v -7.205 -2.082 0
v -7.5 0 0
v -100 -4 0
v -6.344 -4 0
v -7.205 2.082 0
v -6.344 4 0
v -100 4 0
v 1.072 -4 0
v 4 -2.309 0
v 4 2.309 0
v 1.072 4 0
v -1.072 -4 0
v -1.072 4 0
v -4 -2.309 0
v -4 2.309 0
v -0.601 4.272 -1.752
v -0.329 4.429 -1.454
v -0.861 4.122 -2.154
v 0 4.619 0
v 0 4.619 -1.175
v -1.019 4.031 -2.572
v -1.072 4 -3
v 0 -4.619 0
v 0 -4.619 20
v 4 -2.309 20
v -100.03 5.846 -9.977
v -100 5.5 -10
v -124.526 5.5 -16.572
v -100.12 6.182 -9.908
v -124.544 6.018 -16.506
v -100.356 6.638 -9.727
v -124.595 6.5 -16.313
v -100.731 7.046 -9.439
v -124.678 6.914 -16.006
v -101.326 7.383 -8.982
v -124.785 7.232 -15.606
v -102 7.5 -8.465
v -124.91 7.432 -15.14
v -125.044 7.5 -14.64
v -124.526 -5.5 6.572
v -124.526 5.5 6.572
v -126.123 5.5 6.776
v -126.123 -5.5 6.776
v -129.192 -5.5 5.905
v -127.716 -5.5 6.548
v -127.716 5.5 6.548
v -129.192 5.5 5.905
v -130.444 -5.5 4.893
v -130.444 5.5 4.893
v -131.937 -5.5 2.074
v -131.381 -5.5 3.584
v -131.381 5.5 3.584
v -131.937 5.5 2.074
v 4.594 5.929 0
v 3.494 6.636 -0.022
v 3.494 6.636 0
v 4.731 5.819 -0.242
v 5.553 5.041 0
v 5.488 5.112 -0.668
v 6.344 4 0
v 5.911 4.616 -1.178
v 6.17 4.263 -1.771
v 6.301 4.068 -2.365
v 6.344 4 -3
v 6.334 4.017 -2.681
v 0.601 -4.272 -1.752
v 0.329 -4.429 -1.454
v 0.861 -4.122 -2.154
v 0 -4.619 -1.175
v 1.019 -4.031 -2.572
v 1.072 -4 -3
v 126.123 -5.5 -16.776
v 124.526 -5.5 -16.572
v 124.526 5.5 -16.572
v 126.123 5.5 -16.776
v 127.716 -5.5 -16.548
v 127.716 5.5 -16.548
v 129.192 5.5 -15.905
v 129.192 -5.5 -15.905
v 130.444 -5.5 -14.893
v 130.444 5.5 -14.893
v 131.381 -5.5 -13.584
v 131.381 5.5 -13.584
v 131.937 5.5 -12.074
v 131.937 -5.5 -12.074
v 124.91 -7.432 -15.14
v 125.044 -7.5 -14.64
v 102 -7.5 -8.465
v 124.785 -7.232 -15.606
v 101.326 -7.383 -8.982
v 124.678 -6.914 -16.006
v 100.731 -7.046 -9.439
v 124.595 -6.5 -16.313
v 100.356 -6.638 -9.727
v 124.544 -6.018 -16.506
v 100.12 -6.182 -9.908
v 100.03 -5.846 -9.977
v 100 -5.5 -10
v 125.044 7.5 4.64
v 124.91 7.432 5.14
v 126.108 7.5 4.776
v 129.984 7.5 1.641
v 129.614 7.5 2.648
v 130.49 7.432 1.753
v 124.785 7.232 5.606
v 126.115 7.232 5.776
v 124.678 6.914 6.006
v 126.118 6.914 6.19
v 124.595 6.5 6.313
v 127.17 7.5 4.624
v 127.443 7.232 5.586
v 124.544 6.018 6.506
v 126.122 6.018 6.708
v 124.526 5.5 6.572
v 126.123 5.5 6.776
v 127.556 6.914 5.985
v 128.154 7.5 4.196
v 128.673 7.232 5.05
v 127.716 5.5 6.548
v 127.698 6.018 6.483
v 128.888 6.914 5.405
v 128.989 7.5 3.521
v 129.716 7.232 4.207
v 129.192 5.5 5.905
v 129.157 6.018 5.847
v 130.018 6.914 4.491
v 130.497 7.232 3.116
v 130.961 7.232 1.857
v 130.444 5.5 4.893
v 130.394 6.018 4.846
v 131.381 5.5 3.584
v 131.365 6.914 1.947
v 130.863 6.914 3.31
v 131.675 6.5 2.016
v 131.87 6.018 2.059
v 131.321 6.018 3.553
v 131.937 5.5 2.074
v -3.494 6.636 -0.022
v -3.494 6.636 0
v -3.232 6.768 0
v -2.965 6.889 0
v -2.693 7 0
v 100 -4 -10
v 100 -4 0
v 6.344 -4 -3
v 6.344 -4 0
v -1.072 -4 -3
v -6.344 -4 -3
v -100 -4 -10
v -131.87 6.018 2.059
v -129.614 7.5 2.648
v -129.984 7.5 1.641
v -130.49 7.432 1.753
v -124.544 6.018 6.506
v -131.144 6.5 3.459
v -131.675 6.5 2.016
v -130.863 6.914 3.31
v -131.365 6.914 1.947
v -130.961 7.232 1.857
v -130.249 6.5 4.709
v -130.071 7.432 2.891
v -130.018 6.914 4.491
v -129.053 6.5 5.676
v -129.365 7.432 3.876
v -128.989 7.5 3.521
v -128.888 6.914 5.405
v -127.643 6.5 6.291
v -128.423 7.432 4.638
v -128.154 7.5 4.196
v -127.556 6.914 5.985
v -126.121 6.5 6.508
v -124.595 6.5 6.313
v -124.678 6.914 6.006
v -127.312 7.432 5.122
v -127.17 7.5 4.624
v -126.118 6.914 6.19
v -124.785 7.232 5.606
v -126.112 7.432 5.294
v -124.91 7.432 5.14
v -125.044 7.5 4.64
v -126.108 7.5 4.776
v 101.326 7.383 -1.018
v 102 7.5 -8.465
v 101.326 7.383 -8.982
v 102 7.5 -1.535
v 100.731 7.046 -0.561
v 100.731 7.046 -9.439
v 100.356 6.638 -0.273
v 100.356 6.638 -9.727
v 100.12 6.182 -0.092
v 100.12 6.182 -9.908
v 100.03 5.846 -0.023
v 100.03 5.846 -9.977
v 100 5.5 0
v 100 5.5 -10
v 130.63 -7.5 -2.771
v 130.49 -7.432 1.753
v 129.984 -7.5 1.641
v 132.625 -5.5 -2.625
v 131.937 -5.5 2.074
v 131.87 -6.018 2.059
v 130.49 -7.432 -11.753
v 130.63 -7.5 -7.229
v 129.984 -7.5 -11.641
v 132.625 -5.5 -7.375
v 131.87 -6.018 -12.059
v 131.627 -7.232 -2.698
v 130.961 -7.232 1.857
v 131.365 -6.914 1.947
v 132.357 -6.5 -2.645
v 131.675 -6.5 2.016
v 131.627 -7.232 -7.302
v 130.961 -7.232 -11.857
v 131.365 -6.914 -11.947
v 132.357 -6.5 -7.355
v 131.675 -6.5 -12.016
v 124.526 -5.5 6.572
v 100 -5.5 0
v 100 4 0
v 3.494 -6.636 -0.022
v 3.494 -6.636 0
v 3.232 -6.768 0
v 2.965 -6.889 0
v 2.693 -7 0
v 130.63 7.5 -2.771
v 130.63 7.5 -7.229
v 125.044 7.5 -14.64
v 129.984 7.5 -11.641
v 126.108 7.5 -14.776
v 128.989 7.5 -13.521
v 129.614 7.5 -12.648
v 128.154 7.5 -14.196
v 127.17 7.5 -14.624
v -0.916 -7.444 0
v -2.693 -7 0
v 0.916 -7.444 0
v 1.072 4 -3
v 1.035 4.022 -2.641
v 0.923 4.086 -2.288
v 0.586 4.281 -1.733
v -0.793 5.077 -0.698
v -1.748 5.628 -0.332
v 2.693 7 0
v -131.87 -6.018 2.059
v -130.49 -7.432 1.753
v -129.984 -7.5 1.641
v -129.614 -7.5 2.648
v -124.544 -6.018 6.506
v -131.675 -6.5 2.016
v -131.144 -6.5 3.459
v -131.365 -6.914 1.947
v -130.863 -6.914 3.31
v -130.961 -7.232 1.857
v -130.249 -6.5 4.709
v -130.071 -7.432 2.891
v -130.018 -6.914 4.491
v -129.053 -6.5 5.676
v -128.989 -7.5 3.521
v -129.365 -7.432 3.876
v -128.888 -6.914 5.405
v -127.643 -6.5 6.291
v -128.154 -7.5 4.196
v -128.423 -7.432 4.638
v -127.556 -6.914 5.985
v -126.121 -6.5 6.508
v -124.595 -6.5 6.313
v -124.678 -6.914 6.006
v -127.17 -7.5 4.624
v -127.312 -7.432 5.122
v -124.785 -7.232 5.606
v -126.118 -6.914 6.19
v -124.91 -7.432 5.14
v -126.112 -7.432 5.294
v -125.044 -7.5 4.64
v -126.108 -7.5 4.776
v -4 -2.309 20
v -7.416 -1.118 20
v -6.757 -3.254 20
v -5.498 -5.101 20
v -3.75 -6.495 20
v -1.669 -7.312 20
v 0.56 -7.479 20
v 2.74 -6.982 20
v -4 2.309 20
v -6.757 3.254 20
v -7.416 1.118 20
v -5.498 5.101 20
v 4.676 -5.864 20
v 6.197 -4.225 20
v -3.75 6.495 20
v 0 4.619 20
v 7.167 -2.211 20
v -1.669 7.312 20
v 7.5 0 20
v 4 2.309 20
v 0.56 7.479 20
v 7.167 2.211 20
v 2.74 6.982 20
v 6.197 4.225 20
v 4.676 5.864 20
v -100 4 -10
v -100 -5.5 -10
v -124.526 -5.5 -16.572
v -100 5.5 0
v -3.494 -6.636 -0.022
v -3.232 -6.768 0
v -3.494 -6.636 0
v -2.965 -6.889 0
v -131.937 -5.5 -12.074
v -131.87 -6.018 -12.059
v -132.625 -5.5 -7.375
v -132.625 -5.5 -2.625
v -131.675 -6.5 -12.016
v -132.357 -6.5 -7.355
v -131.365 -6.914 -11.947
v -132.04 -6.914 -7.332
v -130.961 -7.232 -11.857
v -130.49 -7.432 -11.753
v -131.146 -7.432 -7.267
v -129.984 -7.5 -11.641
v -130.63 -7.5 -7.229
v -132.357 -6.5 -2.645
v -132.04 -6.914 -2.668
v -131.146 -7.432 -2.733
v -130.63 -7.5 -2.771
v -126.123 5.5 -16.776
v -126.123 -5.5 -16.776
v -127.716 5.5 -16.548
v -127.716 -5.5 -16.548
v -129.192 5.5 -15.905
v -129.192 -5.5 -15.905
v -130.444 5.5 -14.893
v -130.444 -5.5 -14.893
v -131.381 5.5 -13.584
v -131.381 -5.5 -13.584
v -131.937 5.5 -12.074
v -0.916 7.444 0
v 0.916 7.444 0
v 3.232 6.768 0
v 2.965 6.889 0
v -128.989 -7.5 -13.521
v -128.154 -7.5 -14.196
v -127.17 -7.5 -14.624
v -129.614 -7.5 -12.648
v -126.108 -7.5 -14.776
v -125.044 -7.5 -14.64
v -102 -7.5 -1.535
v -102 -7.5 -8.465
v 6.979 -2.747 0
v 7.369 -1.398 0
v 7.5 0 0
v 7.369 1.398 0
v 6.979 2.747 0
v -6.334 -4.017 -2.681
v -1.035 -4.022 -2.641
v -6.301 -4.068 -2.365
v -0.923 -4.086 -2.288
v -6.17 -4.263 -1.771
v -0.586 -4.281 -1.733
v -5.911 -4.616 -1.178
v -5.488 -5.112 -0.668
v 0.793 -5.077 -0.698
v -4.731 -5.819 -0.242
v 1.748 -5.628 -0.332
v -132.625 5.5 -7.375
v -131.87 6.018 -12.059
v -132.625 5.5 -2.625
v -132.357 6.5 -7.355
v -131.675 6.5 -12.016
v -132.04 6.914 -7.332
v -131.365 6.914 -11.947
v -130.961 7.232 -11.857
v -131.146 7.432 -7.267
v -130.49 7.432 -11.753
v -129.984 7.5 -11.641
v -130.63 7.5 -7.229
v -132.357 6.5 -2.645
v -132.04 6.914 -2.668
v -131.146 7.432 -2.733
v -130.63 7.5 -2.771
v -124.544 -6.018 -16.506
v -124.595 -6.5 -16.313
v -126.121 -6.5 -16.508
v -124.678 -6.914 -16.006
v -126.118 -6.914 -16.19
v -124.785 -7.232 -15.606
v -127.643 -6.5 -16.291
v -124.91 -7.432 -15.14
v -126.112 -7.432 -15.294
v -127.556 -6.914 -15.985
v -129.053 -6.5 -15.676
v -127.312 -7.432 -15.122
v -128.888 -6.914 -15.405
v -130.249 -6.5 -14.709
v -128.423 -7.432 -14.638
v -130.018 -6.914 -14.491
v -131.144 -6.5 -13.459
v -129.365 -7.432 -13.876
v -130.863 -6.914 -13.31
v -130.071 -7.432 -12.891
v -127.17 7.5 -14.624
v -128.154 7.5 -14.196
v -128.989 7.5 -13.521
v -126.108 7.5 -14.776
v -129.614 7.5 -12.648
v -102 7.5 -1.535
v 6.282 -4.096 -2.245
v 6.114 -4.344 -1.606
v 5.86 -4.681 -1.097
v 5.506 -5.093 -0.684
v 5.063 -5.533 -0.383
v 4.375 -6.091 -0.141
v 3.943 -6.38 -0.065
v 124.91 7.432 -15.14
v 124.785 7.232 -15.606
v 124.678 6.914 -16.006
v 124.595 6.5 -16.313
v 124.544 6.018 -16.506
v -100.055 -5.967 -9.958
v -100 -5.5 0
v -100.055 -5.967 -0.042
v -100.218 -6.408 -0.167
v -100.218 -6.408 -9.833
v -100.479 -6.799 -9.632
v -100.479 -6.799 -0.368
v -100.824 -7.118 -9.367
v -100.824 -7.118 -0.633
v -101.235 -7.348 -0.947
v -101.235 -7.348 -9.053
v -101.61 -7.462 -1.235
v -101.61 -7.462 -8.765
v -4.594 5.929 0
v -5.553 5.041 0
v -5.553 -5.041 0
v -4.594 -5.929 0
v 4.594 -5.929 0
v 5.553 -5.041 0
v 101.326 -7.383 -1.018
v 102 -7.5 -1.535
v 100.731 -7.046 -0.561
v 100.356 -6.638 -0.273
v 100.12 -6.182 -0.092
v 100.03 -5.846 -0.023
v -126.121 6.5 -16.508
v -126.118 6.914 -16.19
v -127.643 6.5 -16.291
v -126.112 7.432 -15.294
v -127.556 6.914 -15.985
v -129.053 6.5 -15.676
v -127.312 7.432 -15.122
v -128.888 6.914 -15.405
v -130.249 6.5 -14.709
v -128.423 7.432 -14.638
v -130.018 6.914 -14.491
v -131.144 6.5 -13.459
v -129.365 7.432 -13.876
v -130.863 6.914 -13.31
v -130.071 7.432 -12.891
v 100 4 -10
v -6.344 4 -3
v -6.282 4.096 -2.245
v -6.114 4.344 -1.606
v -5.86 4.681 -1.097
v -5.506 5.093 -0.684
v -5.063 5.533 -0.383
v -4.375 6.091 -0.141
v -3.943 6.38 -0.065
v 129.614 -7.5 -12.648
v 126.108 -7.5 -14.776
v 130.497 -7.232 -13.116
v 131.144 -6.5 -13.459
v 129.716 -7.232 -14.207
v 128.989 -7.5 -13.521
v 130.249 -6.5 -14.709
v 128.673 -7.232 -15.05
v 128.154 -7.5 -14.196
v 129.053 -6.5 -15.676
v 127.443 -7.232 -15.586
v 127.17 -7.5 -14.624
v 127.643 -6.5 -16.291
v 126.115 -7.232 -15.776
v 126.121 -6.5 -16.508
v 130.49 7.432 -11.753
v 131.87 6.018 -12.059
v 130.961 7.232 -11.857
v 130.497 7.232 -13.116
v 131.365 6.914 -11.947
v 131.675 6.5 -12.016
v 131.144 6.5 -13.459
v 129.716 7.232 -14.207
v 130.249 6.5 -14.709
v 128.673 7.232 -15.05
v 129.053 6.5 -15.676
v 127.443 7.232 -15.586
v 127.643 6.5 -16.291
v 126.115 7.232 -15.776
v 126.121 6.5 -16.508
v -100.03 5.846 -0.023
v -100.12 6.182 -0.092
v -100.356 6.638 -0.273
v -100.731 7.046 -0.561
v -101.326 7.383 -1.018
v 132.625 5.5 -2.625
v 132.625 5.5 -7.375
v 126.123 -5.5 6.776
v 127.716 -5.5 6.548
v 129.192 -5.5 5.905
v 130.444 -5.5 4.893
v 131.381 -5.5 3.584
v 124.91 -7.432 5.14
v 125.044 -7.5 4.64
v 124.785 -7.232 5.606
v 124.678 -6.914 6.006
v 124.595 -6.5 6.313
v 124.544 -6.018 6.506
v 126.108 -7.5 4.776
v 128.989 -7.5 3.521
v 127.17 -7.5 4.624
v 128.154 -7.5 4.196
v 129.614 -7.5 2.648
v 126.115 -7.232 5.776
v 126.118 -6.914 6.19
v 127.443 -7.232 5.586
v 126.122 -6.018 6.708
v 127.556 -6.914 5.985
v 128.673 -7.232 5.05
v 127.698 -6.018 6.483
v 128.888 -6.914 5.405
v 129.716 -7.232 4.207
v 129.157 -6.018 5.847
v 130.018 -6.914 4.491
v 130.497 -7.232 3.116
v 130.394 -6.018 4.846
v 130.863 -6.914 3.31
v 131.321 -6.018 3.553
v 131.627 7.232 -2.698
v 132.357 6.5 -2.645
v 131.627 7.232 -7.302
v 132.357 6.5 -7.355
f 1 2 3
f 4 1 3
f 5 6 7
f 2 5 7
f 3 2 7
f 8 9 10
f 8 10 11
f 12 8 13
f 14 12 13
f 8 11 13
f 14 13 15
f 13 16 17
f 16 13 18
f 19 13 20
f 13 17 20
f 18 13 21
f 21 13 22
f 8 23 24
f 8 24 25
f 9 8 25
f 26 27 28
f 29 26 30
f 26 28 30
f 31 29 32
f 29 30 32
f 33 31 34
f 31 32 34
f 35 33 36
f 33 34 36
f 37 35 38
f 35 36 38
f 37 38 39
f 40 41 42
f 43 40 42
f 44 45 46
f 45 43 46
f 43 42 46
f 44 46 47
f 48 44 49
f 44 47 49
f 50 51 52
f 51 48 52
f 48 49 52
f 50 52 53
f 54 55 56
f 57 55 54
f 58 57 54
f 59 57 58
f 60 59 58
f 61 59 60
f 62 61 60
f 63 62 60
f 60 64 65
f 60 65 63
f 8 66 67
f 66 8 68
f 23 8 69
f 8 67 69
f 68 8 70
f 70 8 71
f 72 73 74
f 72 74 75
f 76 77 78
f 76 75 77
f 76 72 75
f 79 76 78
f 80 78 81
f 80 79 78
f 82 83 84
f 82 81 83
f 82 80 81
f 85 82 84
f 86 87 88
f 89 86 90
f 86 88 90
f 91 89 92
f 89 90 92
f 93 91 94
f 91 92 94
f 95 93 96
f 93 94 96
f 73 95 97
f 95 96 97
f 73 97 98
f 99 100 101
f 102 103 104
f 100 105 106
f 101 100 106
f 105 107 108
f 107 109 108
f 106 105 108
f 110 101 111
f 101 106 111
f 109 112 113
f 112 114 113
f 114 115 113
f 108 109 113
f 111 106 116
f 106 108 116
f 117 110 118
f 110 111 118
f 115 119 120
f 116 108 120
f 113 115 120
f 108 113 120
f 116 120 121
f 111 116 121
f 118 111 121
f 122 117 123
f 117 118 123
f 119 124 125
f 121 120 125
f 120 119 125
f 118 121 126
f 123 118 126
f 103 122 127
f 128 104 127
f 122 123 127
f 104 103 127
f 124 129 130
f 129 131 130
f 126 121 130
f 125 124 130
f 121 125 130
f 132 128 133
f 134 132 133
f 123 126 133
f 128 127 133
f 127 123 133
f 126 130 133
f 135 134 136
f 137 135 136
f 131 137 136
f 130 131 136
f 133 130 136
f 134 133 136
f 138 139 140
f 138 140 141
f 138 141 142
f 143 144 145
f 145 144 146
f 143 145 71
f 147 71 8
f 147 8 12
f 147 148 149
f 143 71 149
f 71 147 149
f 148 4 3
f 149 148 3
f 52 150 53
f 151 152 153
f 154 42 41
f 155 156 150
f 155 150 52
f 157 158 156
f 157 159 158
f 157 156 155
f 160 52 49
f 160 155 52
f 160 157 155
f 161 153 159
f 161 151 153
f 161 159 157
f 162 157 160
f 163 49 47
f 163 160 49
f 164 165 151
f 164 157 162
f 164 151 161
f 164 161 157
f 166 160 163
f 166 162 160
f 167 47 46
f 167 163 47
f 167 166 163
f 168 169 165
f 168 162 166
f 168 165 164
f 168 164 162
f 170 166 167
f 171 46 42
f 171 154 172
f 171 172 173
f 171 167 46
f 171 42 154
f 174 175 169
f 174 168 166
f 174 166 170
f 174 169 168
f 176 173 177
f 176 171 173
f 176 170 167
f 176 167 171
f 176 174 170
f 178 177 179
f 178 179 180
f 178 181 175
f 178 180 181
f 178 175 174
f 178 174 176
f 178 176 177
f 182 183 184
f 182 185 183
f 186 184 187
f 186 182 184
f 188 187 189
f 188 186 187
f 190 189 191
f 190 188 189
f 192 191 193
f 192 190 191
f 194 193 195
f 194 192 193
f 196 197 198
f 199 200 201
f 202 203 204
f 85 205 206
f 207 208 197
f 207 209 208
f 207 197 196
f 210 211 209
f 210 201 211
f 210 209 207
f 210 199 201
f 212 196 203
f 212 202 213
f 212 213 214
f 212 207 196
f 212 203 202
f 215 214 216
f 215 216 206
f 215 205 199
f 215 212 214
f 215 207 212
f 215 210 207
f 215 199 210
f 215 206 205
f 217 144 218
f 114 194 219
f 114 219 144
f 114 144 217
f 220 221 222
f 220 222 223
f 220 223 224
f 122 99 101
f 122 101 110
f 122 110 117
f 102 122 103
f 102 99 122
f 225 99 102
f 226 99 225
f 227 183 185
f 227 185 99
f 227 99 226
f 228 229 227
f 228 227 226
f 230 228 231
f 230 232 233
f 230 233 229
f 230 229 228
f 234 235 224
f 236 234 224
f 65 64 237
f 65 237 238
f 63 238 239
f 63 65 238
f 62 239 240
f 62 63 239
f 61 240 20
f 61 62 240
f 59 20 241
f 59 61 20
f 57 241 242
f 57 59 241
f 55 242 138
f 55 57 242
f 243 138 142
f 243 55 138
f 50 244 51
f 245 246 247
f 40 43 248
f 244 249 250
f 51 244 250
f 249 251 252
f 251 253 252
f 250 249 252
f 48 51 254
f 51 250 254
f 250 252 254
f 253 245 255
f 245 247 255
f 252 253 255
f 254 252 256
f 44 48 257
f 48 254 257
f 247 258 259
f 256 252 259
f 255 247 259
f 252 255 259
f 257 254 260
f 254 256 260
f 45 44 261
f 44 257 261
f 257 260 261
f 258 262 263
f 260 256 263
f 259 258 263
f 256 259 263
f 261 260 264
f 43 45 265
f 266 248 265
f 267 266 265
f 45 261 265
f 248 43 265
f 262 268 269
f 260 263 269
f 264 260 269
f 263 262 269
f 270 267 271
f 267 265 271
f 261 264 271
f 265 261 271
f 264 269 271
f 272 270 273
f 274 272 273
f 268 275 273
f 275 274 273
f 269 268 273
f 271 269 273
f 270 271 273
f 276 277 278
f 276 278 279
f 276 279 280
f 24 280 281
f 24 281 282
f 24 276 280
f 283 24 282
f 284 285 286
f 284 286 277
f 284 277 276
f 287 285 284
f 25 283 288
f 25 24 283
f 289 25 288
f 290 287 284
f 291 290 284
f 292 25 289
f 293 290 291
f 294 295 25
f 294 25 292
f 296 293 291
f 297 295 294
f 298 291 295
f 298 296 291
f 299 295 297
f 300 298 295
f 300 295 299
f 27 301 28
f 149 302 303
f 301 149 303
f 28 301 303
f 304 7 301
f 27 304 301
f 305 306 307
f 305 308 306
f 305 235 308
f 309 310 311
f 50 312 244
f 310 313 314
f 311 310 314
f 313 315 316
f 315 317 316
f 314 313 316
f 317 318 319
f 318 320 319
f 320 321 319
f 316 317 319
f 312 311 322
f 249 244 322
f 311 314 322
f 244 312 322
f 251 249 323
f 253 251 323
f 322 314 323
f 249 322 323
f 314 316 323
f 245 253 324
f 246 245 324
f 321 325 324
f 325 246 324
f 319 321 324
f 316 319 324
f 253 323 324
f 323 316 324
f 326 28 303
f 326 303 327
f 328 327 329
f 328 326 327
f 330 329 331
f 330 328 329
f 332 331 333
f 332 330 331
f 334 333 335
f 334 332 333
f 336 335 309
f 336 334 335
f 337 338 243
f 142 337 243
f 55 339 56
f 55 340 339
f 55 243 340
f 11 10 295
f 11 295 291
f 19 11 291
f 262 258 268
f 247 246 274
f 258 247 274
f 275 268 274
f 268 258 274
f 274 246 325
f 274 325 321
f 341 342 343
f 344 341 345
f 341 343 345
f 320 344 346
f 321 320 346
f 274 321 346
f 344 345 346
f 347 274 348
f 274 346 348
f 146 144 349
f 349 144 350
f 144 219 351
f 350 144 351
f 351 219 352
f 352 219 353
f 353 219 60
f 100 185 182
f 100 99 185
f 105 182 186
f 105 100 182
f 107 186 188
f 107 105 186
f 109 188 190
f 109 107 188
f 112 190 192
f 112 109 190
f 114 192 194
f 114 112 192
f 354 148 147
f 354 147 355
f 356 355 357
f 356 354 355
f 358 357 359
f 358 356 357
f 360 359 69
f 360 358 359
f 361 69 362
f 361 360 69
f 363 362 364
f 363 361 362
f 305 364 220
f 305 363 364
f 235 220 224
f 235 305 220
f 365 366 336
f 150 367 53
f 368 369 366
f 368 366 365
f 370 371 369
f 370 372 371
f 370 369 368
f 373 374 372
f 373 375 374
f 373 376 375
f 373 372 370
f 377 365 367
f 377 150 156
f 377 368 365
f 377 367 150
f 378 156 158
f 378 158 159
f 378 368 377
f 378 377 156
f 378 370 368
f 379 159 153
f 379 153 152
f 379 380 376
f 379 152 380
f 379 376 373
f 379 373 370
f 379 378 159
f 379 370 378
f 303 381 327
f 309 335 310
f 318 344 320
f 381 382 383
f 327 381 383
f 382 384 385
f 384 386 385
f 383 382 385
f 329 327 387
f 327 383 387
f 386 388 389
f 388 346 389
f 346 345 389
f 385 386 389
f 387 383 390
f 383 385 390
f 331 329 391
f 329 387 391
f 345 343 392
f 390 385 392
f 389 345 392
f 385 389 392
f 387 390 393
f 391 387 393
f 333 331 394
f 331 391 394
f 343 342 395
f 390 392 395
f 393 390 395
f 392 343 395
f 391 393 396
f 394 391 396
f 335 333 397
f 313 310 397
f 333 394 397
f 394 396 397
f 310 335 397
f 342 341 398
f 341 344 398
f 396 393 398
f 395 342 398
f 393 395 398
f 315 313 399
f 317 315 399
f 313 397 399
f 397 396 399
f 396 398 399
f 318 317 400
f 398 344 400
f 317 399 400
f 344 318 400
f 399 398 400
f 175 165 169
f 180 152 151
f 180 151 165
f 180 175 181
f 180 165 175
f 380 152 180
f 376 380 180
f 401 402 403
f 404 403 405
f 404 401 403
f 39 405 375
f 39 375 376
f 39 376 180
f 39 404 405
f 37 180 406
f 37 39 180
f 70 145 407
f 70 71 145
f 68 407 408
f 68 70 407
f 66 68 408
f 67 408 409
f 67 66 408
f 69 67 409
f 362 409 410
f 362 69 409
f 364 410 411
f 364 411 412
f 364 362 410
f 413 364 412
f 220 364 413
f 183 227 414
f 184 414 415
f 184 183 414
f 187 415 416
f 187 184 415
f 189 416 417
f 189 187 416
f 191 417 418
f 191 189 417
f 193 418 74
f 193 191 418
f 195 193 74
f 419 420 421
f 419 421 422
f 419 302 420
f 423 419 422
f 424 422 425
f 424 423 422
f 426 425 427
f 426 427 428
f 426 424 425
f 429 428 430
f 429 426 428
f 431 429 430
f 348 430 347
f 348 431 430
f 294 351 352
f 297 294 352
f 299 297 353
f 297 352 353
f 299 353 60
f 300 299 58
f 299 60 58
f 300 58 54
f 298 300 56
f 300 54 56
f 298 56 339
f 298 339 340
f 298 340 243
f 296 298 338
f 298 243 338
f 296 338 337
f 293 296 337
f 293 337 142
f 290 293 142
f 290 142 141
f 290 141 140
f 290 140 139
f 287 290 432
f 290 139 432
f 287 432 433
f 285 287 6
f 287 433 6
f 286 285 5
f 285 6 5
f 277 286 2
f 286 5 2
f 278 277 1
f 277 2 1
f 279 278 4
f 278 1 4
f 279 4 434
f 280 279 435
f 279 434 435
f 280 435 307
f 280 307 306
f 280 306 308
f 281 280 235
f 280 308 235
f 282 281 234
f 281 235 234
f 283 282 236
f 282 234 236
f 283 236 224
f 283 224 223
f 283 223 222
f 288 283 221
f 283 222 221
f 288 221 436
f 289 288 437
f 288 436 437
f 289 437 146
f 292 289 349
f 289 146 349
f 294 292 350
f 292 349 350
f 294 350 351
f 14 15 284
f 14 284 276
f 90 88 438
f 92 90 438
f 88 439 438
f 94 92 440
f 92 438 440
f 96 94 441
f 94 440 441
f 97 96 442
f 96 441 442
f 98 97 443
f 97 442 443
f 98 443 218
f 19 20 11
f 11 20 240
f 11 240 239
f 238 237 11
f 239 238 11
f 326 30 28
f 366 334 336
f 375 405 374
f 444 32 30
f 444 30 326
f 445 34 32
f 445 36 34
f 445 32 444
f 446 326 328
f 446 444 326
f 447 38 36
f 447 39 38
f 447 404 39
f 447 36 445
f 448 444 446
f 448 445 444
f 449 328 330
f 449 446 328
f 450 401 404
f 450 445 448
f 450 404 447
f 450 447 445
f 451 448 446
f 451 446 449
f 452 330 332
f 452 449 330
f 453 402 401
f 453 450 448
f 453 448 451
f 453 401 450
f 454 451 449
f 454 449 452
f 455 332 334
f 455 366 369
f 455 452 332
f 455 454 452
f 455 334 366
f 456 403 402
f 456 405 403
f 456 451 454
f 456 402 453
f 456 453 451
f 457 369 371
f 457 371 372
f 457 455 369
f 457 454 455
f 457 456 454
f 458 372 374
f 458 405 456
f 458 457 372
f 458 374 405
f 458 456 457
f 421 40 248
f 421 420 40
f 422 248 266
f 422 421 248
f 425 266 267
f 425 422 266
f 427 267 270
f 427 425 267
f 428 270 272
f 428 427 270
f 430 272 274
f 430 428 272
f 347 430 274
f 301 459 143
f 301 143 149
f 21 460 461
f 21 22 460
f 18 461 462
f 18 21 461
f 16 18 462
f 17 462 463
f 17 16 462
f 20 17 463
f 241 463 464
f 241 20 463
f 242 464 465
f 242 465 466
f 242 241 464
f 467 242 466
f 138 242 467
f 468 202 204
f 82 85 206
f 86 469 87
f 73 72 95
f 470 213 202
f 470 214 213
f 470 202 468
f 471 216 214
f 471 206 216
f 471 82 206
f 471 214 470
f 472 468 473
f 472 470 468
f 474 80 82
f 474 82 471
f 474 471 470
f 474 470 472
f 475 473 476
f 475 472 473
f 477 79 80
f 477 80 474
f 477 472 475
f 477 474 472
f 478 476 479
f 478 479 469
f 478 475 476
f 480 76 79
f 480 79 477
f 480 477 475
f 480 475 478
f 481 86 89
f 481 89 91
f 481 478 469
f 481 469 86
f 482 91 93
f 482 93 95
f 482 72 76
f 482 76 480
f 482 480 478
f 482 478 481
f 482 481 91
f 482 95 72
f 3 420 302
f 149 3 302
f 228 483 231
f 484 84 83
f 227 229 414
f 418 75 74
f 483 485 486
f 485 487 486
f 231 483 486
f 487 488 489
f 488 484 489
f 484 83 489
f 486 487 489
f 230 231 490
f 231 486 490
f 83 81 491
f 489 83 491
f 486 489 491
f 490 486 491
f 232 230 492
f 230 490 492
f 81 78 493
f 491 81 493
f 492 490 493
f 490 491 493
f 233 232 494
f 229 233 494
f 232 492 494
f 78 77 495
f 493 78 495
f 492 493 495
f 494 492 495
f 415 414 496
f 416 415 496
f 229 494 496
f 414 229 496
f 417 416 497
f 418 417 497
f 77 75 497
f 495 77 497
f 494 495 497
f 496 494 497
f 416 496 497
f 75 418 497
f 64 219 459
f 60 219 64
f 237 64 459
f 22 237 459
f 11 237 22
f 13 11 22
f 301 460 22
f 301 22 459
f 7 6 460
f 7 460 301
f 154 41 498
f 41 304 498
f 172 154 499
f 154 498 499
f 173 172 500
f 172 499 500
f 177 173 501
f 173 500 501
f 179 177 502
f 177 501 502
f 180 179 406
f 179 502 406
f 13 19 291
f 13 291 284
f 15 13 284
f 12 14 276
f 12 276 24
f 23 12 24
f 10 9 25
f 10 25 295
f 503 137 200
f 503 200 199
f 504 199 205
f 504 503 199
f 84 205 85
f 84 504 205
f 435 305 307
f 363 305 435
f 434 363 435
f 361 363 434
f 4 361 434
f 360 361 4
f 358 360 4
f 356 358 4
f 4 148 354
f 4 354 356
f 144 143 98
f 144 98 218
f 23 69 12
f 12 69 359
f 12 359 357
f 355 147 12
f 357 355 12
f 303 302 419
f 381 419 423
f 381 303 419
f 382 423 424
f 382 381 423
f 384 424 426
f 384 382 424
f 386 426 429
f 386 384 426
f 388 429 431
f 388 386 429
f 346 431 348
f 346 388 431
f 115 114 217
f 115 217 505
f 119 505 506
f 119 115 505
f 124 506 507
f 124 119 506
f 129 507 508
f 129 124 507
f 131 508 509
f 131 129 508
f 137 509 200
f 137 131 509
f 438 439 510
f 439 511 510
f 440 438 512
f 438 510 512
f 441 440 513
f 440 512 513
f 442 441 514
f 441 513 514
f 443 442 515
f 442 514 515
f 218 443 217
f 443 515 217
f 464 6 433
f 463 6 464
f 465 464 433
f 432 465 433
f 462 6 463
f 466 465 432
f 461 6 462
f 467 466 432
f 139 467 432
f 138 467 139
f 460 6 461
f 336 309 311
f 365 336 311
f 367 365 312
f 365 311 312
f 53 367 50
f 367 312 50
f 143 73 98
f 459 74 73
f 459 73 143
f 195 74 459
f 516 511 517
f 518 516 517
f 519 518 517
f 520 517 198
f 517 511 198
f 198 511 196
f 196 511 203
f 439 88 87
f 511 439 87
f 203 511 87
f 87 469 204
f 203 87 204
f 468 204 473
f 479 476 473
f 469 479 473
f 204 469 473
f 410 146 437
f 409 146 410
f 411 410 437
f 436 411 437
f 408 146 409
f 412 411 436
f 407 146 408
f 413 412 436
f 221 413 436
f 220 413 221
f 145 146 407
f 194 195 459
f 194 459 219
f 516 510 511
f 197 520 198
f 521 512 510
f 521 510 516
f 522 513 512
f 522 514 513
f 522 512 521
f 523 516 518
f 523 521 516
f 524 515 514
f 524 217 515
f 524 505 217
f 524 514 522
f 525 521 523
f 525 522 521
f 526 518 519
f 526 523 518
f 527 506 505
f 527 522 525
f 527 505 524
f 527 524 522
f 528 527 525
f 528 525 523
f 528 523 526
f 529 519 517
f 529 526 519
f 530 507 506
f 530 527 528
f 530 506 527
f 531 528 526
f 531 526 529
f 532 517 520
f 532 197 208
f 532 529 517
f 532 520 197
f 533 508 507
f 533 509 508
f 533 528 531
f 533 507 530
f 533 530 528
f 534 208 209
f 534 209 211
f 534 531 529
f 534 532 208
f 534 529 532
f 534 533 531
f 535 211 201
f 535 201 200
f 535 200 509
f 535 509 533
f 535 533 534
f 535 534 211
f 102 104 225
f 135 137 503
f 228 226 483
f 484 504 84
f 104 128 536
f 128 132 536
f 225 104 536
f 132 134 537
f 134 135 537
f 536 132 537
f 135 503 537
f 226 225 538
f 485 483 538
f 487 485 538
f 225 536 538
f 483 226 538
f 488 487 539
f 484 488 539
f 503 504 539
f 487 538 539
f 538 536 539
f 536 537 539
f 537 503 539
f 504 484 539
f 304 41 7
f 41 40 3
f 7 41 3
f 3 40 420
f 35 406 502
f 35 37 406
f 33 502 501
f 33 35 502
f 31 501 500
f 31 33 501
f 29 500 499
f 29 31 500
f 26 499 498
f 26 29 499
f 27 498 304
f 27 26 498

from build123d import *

# Parameters (mm, degrees)
SKETCH_1_R      = 7.5
EXTRUDE_1_DEPTH = 20
SKETCH_2_W      = 200
SKETCH_2_H      = 8
EXTRUDE_2_DEPTH = 10
EXTRUDE_3_DEPTH = 7.5
FILLET_2_R      = 6
FILLET_3_R      = 2
FILLET_4_R      = 3


with BuildPart() as part:
    # 草图1 → 凸台-拉伸1 (new body)
    with BuildSketch(Plane.XY):
        Circle(SKETCH_1_R)
        Polygon((0, -4.618802154), (4, -2.309401077), (4, 2.309401077), (0, 4.618802154), (-4, 2.309401077), (-4, -2.309401077), align=None, mode=Mode.SUBTRACT)
    extrude(amount=EXTRUDE_1_DEPTH)

    # 草图2 → 凸台-拉伸2 (add)
    with BuildSketch(Plane(origin=(0, 0, 0), x_dir=(-1, 0, 0), z_dir=(0, 0, -1))):
        Rectangle(SKETCH_2_W, SKETCH_2_H)
    extrude(amount=EXTRUDE_2_DEPTH)

    # 草图3 → 凸台-拉伸3 (add, symmetric)
    with BuildSketch(Plane(origin=(0, 0, 0), x_dir=(1, 0, 0), z_dir=(0, 1, 0))):
        with BuildLine():
            Line((-100, 10), (-130, 18.038475773))
            ThreePointArc((-130, 18.038475773), (-132.710882753, 5), (-130, -8.038475773))
            Line((-130, -8.038475773), (-100, 0))
            Line((-100, 0), (-100, 10))
        make_face()
        with BuildLine():
            Line((100, 10), (100, 0))
            Line((100, 0), (130, -8.038475773))
            ThreePointArc((130, -8.038475773), (132.710882753, 5), (130, 18.038475773))
            Line((130, 18.038475773), (100, 10))
        make_face()
    extrude(amount=EXTRUDE_3_DEPTH, both=True)

    # 圆角2
    fillet_2_edges = [part.edges().sort_by_distance(p)[0] for p in [
        (-130, 0, -18.038475773),
        (-130, 0, 8.038475773),
        (130, 0, 8.038475773),
        (130, 0, -18.038475773),
    ]]
    fillet(fillet_2_edges, radius=FILLET_2_R)

    # 圆角3
    fillet_3_edges = [part.edges().sort_by_distance(p)[0] for p in [
        (-100, -7.5, -5),
        (-112.262976322, -7.5, -13.285854602),
        (-100, 7.5, -5),
        (-112.262976322, 7.5, -13.285854602),
        (100, -7.5, -5),
        (112.262976322, -7.5, 3.285854602),
        (100, 7.5, -5),
        (112.262976322, 7.5, 3.285854602),
        (-132.710882753, -7.5, -5),
        (-132.710882753, 7.5, -5),
        (-112.262976322, -7.5, 3.285854602),
        (-129.192011847, -7.5, 5.905318763),
        (-129.192011847, -7.5, -15.905318763),
        (-112.262976322, 7.5, 3.285854602),
        (-129.192011847, 7.5, 5.905318763),
        (-129.192011847, 7.5, -15.905318763),
        (112.262976322, -7.5, -13.285854602),
        (112.262976322, 7.5, -13.285854602),
        (132.710882753, -7.5, -5),
        (129.192011847, -7.5, 5.905318763),
        (129.192011847, -7.5, -15.905318763),
        (132.710882753, 7.5, -5),
        (129.192011847, 7.5, 5.905318763),
        (129.192011847, 7.5, -15.905318763),
    ]]
    fillet(fillet_3_edges, radius=FILLET_3_R)

    # 圆角4
    # the kernel refuses this fillet: 3 mm, written as the material it adds along each edge
    with BuildSketch(Plane(origin=(-6.42820323, -4, 0), x_dir=(0, 0, -1), z_dir=(1, 0, 0))) as fillet_4_piece_1_section:
        with BuildLine():
            CenterArc((FILLET_4_R, -FILLET_4_R), FILLET_4_R, 90, 90)
            Line((0, -FILLET_4_R), (0, 0))
            Line((0, 0), (FILLET_4_R, 0))
        make_face()
    fillet_4_piece_1 = extrude(amount=20.272492001, mode=Mode.PRIVATE)
    fillet_4_piece_1 = fillet_4_piece_1 & Plane(origin=(0, 0, -0.715829883), x_dir=(1, 0, 0), z_dir=(0, 0, -1)) * Cylinder(7.5, 53, mode=Mode.PRIVATE)
    fillet_4_piece_1 = split(fillet_4_piece_1, bisect_by=Plane(origin=(-2.485789841, -3.18363072, -0.715829883), z_dir=(-0.5000000000000003, -0.8660254037844387, 0)), keep=Keep.TOP, mode=Mode.PRIVATE)
    add(fillet_4_piece_1)
    with BuildSketch(Plane(origin=(-6.42820323, -4, 0), x_dir=(0, 0, -1), z_dir=(1, 0, 0))) as fillet_4_piece_2_section:
        with BuildLine():
            CenterArc((FILLET_4_R, -FILLET_4_R), FILLET_4_R, 90, 90)
            Line((0, -FILLET_4_R), (0, 0))
            Line((0, 0), (FILLET_4_R, 0))
        make_face()
    fillet_4_piece_2 = extrude(amount=20.272492001, mode=Mode.PRIVATE)
    fillet_4_piece_2 = fillet_4_piece_2 & Plane(origin=(0, 0, -0.715830721), x_dir=(1, 0, 0), z_dir=(0, 0, -1)) * Cylinder(7.5, 53, mode=Mode.PRIVATE)
    fillet_4_piece_2 = split(fillet_4_piece_2, bisect_by=Plane(origin=(2.485790597, -3.183630283, -0.715830721), z_dir=(0.4999999999999999, -0.8660254037844388, 0)), keep=Keep.TOP, mode=Mode.PRIVATE)
    add(fillet_4_piece_2)
    with BuildSketch(Plane(origin=(-13.84428877, -4, 0), x_dir=(0, 0, -1), z_dir=(1, 0, 0))) as fillet_4_piece_3_section:
        with BuildLine():
            CenterArc((FILLET_4_R, -FILLET_4_R), FILLET_4_R, 90, 90)
            Line((0, -FILLET_4_R), (0, 0))
            Line((0, 0), (FILLET_4_R, 0))
        make_face()
    fillet_4_piece_3 = extrude(amount=20.272492001, mode=Mode.PRIVATE)
    fillet_4_piece_3 = fillet_4_piece_3 & Plane(origin=(0, 0, -0.715829883), x_dir=(1, 0, 0), z_dir=(0, 0, -1)) * Cylinder(7.5, 53, mode=Mode.PRIVATE)
    fillet_4_piece_3 = split(fillet_4_piece_3, bisect_by=Plane(origin=(-2.485789841, -3.18363072, -0.715829883), z_dir=(-0.5000000000000003, -0.8660254037844387, 0)), keep=Keep.TOP, mode=Mode.PRIVATE)
    add(fillet_4_piece_3)
    with BuildSketch(Plane(origin=(-13.84428877, -4, 0), x_dir=(0, 0, -1), z_dir=(1, 0, 0))) as fillet_4_piece_4_section:
        with BuildLine():
            CenterArc((FILLET_4_R, -FILLET_4_R), FILLET_4_R, 90, 90)
            Line((0, -FILLET_4_R), (0, 0))
            Line((0, 0), (FILLET_4_R, 0))
        make_face()
    fillet_4_piece_4 = extrude(amount=20.272492001, mode=Mode.PRIVATE)
    fillet_4_piece_4 = fillet_4_piece_4 & Plane(origin=(0, 0, -0.715830721), x_dir=(1, 0, 0), z_dir=(0, 0, -1)) * Cylinder(7.5, 53, mode=Mode.PRIVATE)
    fillet_4_piece_4 = split(fillet_4_piece_4, bisect_by=Plane(origin=(2.485790597, -3.183630283, -0.715830721), z_dir=(0.4999999999999999, -0.8660254037844388, 0)), keep=Keep.TOP, mode=Mode.PRIVATE)
    add(fillet_4_piece_4)
    with BuildSketch(Plane(origin=(6.42820323, 4, 0), x_dir=(0, 0, -1), z_dir=(-1, 0, 0))) as fillet_4_piece_5_section:
        with BuildLine():
            CenterArc((FILLET_4_R, -FILLET_4_R), FILLET_4_R, 90, 90)
            Line((0, -FILLET_4_R), (0, 0))
            Line((0, 0), (FILLET_4_R, 0))
        make_face()
    fillet_4_piece_5 = extrude(amount=20.272492001, mode=Mode.PRIVATE)
    fillet_4_piece_5 = fillet_4_piece_5 & Plane(origin=(0, 0, -0.715829883), x_dir=(1, 0, 0), z_dir=(0, 0, -1)) * Cylinder(7.5, 53, mode=Mode.PRIVATE)
    fillet_4_piece_5 = split(fillet_4_piece_5, bisect_by=Plane(origin=(2.485789841, 3.18363072, -0.715829883), z_dir=(0.5, 0.8660254037844387, 0)), keep=Keep.TOP, mode=Mode.PRIVATE)
    add(fillet_4_piece_5)
    with BuildSketch(Plane(origin=(6.42820323, 4, 0), x_dir=(0, 0, -1), z_dir=(-1, 0, 0))) as fillet_4_piece_6_section:
        with BuildLine():
            CenterArc((FILLET_4_R, -FILLET_4_R), FILLET_4_R, 90, 90)
            Line((0, -FILLET_4_R), (0, 0))
            Line((0, 0), (FILLET_4_R, 0))
        make_face()
    fillet_4_piece_6 = extrude(amount=20.272492001, mode=Mode.PRIVATE)
    fillet_4_piece_6 = fillet_4_piece_6 & Plane(origin=(0, 0, -0.715830721), x_dir=(1, 0, 0), z_dir=(0, 0, -1)) * Cylinder(7.5, 53, mode=Mode.PRIVATE)
    fillet_4_piece_6 = split(fillet_4_piece_6, bisect_by=Plane(origin=(-2.485790597, 3.183630283, -0.715830721), z_dir=(-0.5000000000000001, 0.8660254037844387, 0)), keep=Keep.TOP, mode=Mode.PRIVATE)
    add(fillet_4_piece_6)
    with BuildSketch(Plane(origin=(13.84428877, 4, 0), x_dir=(0, 0, -1), z_dir=(-1, 0, 0))) as fillet_4_piece_7_section:
        with BuildLine():
            CenterArc((FILLET_4_R, -FILLET_4_R), FILLET_4_R, 90, 90)
            Line((0, -FILLET_4_R), (0, 0))
            Line((0, 0), (FILLET_4_R, 0))
        make_face()
    fillet_4_piece_7 = extrude(amount=20.272492001, mode=Mode.PRIVATE)
    fillet_4_piece_7 = fillet_4_piece_7 & Plane(origin=(0, 0, -0.715829883), x_dir=(1, 0, 0), z_dir=(0, 0, -1)) * Cylinder(7.5, 53, mode=Mode.PRIVATE)
    fillet_4_piece_7 = split(fillet_4_piece_7, bisect_by=Plane(origin=(2.485789841, 3.18363072, -0.715829883), z_dir=(0.5, 0.8660254037844387, 0)), keep=Keep.TOP, mode=Mode.PRIVATE)
    add(fillet_4_piece_7)
    with BuildSketch(Plane(origin=(13.84428877, 4, 0), x_dir=(0, 0, -1), z_dir=(-1, 0, 0))) as fillet_4_piece_8_section:
        with BuildLine():
            CenterArc((FILLET_4_R, -FILLET_4_R), FILLET_4_R, 90, 90)
            Line((0, -FILLET_4_R), (0, 0))
            Line((0, 0), (FILLET_4_R, 0))
        make_face()
    fillet_4_piece_8 = extrude(amount=20.272492001, mode=Mode.PRIVATE)
    fillet_4_piece_8 = fillet_4_piece_8 & Plane(origin=(0, 0, -0.715830721), x_dir=(1, 0, 0), z_dir=(0, 0, -1)) * Cylinder(7.5, 53, mode=Mode.PRIVATE)
    fillet_4_piece_8 = split(fillet_4_piece_8, bisect_by=Plane(origin=(-2.485790597, 3.183630283, -0.715830721), z_dir=(-0.5000000000000001, 0.8660254037844387, 0)), keep=Keep.TOP, mode=Mode.PRIVATE)
    add(fillet_4_piece_8)


solid = part.part
